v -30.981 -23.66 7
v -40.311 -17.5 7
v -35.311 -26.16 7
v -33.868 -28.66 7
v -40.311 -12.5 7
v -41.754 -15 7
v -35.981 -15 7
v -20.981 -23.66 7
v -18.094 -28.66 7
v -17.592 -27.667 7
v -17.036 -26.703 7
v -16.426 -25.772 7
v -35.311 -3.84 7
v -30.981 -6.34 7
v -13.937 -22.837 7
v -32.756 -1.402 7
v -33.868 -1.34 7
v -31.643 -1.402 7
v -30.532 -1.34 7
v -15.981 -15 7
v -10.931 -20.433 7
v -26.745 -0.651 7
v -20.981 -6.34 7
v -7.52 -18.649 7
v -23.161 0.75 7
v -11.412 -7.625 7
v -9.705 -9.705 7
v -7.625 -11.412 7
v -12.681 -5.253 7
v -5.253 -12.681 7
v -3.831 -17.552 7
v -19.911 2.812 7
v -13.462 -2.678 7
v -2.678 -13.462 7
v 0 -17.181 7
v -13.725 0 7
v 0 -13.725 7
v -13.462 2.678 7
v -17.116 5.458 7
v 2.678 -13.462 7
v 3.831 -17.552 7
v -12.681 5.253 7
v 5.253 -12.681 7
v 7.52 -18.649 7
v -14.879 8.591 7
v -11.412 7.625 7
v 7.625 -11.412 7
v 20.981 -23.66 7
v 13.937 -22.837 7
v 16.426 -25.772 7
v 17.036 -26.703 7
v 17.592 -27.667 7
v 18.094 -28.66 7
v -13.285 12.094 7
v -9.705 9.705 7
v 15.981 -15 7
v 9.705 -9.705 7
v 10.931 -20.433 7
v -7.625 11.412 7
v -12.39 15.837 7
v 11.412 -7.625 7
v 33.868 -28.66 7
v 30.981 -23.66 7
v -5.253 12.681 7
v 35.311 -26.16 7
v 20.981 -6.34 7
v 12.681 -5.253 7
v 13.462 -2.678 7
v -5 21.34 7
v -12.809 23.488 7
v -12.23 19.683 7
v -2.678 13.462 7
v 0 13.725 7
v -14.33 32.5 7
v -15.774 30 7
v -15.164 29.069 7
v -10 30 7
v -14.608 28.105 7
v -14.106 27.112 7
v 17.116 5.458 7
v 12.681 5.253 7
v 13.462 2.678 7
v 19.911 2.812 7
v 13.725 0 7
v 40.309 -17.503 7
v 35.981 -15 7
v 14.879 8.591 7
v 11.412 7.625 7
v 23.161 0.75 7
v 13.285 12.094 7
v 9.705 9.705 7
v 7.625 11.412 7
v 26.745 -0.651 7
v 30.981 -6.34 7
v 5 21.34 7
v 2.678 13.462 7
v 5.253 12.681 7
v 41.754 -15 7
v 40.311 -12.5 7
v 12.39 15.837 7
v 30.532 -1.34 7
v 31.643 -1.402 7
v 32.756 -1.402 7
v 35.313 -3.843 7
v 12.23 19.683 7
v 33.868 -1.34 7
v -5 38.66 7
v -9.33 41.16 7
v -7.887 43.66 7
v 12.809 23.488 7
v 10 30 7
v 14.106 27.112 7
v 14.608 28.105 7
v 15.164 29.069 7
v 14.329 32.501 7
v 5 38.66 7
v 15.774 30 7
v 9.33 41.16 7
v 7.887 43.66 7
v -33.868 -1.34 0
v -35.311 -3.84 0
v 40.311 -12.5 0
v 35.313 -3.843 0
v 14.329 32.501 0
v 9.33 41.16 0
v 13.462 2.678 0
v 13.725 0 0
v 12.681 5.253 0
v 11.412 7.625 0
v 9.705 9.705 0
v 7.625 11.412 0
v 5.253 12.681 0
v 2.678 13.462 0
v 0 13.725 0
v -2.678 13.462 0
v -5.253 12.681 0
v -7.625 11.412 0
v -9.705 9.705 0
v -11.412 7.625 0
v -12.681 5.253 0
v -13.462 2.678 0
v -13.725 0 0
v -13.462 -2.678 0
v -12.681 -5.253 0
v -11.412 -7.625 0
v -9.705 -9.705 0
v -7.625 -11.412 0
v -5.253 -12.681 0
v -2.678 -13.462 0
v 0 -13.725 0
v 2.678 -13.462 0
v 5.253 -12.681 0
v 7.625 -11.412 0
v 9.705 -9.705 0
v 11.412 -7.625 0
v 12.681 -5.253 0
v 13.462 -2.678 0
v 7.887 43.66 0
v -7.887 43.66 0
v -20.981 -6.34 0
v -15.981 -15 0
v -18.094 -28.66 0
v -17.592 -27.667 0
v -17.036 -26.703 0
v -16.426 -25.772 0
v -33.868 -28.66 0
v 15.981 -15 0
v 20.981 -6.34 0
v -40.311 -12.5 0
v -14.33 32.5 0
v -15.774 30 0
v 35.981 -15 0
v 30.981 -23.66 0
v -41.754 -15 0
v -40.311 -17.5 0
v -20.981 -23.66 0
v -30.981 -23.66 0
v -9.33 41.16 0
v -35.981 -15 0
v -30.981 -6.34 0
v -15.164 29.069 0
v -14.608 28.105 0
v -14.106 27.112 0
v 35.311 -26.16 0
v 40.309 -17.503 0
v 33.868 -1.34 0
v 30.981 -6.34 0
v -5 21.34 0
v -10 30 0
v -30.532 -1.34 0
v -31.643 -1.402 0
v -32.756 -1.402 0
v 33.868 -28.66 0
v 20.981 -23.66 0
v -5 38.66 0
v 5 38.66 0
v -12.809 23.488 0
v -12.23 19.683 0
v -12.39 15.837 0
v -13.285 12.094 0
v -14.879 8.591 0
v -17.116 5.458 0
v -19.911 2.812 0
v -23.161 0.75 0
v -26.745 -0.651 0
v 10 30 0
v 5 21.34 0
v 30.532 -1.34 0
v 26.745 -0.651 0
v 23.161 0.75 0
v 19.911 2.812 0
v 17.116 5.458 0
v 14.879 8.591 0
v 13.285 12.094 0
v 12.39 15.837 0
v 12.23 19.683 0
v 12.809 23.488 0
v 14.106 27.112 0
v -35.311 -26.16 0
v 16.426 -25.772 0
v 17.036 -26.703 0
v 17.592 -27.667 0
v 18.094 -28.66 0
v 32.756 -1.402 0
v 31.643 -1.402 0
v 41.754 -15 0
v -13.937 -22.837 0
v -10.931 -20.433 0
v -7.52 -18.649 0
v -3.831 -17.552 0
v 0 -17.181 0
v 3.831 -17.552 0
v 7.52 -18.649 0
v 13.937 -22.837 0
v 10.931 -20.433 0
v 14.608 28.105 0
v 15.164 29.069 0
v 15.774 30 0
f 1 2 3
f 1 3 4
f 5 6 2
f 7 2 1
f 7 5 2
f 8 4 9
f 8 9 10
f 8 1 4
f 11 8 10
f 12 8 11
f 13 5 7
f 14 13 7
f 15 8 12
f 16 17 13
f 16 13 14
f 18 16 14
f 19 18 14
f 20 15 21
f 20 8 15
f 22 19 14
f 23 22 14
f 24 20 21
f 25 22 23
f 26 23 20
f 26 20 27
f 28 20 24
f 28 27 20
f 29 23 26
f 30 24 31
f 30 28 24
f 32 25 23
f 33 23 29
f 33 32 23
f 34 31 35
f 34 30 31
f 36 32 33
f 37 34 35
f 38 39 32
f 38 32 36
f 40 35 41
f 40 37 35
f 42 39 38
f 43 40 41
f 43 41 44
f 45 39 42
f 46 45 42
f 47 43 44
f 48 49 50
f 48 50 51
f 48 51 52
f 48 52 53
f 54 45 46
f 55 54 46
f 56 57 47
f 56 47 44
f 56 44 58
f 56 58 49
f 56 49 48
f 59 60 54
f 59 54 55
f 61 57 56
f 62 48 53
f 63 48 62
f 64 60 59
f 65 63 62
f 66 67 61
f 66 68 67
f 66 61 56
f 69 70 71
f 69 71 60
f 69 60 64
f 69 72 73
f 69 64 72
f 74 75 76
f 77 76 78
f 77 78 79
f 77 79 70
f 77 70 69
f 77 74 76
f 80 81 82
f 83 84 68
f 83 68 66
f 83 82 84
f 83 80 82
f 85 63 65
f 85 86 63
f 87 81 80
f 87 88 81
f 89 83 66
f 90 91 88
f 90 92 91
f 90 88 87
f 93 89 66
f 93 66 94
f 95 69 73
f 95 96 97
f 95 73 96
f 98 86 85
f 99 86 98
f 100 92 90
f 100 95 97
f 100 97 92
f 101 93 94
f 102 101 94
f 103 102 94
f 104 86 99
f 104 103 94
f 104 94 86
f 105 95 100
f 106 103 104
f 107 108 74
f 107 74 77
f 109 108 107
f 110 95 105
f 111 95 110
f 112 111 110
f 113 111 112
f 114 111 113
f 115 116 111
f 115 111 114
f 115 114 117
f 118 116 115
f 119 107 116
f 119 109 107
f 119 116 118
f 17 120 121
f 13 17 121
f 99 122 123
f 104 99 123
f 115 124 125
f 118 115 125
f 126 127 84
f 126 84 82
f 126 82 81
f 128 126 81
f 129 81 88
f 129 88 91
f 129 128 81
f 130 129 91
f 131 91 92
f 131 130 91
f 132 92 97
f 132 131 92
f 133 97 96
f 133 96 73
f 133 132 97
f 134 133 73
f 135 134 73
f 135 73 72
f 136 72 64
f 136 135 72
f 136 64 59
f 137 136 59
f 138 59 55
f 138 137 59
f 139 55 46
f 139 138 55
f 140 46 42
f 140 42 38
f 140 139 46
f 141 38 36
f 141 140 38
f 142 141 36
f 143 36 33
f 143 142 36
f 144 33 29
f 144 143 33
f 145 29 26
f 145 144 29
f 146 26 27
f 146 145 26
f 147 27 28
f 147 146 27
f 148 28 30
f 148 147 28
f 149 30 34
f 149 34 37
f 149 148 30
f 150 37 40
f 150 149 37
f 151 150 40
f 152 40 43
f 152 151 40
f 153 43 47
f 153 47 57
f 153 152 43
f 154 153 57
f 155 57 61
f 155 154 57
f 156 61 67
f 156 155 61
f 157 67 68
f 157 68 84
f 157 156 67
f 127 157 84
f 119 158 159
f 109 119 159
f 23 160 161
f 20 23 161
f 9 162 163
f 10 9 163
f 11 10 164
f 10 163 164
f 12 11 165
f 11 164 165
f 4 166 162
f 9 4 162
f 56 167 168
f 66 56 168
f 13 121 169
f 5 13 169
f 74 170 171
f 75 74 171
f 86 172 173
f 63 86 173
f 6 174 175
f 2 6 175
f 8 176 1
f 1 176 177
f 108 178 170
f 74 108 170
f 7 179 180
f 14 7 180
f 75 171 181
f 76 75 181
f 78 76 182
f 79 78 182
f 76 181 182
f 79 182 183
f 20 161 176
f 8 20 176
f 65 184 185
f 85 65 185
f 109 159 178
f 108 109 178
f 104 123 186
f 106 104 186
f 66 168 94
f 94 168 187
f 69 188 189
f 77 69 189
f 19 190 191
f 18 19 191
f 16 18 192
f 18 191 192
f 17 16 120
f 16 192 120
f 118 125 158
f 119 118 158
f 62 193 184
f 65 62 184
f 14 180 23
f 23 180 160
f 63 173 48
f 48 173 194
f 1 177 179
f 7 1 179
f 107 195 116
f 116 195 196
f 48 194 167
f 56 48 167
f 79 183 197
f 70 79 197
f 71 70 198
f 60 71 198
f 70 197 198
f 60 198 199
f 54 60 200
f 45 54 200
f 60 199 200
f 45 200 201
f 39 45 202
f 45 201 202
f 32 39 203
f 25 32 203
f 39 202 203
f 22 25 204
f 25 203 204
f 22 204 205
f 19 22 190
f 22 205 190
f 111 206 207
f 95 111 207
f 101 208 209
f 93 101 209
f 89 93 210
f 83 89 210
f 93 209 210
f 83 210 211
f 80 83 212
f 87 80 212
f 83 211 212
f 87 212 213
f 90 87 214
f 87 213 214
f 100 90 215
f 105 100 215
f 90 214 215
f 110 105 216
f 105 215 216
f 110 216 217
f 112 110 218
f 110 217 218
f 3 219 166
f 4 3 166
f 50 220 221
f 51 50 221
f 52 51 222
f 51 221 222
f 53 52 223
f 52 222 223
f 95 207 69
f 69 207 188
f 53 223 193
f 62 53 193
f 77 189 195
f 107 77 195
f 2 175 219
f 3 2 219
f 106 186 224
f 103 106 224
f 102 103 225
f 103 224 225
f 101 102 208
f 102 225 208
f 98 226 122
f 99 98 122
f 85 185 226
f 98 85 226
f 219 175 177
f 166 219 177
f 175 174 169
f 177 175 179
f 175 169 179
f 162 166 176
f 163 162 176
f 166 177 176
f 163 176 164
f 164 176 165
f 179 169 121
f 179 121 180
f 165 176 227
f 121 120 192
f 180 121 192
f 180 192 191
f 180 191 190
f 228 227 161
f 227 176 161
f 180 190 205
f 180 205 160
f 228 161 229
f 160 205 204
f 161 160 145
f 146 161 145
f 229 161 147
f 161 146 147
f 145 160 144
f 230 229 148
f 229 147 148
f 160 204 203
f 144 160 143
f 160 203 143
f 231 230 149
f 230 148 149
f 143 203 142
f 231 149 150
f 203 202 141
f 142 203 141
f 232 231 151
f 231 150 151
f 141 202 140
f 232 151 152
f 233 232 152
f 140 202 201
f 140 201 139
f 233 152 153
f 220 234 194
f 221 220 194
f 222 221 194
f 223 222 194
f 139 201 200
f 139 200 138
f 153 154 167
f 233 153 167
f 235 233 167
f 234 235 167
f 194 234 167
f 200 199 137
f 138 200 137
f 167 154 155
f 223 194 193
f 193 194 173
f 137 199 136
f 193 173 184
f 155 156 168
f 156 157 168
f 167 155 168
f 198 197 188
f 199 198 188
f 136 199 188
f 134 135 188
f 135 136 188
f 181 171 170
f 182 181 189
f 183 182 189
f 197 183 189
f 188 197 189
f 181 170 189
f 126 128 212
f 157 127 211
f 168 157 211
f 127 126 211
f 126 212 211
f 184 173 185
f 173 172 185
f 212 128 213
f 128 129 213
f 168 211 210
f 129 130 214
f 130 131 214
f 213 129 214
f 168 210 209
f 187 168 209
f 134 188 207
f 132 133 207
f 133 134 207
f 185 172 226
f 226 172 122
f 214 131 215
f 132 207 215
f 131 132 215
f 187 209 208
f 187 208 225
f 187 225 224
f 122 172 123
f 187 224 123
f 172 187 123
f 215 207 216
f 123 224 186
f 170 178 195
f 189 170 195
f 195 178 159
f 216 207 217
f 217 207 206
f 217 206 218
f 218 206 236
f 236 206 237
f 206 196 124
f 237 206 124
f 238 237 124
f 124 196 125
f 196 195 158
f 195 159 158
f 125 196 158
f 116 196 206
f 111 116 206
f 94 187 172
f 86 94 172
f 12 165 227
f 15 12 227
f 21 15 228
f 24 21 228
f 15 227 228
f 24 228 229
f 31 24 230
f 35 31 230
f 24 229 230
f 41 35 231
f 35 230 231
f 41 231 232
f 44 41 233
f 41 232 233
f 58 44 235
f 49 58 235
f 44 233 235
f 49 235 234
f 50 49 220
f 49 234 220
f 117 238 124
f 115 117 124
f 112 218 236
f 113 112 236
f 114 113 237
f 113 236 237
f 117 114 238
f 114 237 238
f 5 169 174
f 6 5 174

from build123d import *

# Parameters (mm, degrees)
F0_R     = 13.725453
F1_DEPTH = 7


with BuildPart() as f1:
    # F0 (on Top) → F1 (new body)
    with BuildSketch(Plane.XY):
        with BuildLine():
            Line((5, 43.660253), (-5, 43.660253))
            Line((-5, 43.660253), (-7.886752, 43.660253))
            Line((-7.886752, 43.660253), (-9.330152, 41.160211))
            Line((-9.330152, 41.160211), (-14.330019, 32.500187))
            Line((-14.330019, 32.500187), (-15.773503, 30))
            ThreePointArc((-15.773503, 30), (-14.879368, 28.590608), (-14.105865, 27.111568))
            ThreePointArc((-14.105865, 27.111568), (-14.879368, 8.590607), (-30.53224, -1.339746))
            ThreePointArc((-30.53224, -1.339746), (-32.199876, -1.409392), (-33.867513, -1.339746))
            Line((-33.867513, -1.339746), (-35.310889, -3.839746))
            Line((-35.310889, -3.839746), (-40.310889, -12.5))
            Line((-40.310889, -12.5), (-41.754264, -15))
            Line((-41.754264, -15), (-40.310888, -17.499999))
            Line((-40.310888, -17.499999), (-35.310888, -26.160254))
            Line((-35.310888, -26.160254), (-33.867512, -28.660255))
            Line((-33.867512, -28.660255), (-30.980762, -28.660255))
            Line((-30.980762, -28.660255), (-20.980762, -28.660255))
            Line((-20.980762, -28.660255), (-18.094012, -28.660255))
            ThreePointArc((-18.094012, -28.660255), (-17.320508, -27.181214), (-16.426373, -25.77182))
            ThreePointArc((-16.426373, -25.77182), (0, -17.181214), (16.426373, -25.77182))
            ThreePointArc((16.426373, -25.77182), (17.320508, -27.181214), (18.094012, -28.660255))
            Line((18.094012, -28.660255), (20.980762, -28.660255))
            Line((20.980762, -28.660255), (30.980762, -28.660255))
            Line((30.980762, -28.660255), (33.867512, -28.660255))
            Line((33.867512, -28.660255), (35.310888, -26.160254))
            Line((35.310888, -26.160254), (40.309298, -17.502755))
            Line((40.309298, -17.502755), (41.754264, -15))
            Line((41.754264, -15), (40.310625, -12.499543))
            Line((40.310625, -12.499543), (35.312513, -3.84256))
            Line((35.312513, -3.84256), (33.867513, -1.339746))
            ThreePointArc((33.867513, -1.339746), (32.199876, -1.409392), (30.53224, -1.339746))
            ThreePointArc((30.53224, -1.339746), (14.879368, 8.590607), (14.105865, 27.111568))
            ThreePointArc((14.105865, 27.111568), (14.879368, 28.590608), (15.773503, 30))
            Line((15.773503, 30), (14.329358, 32.501332))
            Line((14.329358, 32.501332), (9.330202, 41.160124))
            Line((9.330202, 41.160124), (7.886752, 43.660253))
            Line((7.886752, 43.660253), (5, 43.660253))
        make_face()
        Polygon((-30.980762, -6.339746), (-20.980762, -6.339746), (-15.980762, -15), (-20.980762, -23.660254), (-30.980762, -23.660254), (-35.980762, -15), align=None, mode=Mode.SUBTRACT)
        Circle(F0_R, mode=Mode.SUBTRACT)
        Polygon((20.980762, -23.660254), (15.980762, -15), (20.980762, -6.339746), (30.980762, -6.339746), (35.980762, -15), (30.980762, -23.660254), align=None, mode=Mode.SUBTRACT)
        Polygon((10, 30), (5, 21.339746), (-5, 21.339746), (-10, 30), (-5, 38.660254), (5, 38.660254), align=None, mode=Mode.SUBTRACT)
    extrude(amount=F1_DEPTH)


solid = f1.part
